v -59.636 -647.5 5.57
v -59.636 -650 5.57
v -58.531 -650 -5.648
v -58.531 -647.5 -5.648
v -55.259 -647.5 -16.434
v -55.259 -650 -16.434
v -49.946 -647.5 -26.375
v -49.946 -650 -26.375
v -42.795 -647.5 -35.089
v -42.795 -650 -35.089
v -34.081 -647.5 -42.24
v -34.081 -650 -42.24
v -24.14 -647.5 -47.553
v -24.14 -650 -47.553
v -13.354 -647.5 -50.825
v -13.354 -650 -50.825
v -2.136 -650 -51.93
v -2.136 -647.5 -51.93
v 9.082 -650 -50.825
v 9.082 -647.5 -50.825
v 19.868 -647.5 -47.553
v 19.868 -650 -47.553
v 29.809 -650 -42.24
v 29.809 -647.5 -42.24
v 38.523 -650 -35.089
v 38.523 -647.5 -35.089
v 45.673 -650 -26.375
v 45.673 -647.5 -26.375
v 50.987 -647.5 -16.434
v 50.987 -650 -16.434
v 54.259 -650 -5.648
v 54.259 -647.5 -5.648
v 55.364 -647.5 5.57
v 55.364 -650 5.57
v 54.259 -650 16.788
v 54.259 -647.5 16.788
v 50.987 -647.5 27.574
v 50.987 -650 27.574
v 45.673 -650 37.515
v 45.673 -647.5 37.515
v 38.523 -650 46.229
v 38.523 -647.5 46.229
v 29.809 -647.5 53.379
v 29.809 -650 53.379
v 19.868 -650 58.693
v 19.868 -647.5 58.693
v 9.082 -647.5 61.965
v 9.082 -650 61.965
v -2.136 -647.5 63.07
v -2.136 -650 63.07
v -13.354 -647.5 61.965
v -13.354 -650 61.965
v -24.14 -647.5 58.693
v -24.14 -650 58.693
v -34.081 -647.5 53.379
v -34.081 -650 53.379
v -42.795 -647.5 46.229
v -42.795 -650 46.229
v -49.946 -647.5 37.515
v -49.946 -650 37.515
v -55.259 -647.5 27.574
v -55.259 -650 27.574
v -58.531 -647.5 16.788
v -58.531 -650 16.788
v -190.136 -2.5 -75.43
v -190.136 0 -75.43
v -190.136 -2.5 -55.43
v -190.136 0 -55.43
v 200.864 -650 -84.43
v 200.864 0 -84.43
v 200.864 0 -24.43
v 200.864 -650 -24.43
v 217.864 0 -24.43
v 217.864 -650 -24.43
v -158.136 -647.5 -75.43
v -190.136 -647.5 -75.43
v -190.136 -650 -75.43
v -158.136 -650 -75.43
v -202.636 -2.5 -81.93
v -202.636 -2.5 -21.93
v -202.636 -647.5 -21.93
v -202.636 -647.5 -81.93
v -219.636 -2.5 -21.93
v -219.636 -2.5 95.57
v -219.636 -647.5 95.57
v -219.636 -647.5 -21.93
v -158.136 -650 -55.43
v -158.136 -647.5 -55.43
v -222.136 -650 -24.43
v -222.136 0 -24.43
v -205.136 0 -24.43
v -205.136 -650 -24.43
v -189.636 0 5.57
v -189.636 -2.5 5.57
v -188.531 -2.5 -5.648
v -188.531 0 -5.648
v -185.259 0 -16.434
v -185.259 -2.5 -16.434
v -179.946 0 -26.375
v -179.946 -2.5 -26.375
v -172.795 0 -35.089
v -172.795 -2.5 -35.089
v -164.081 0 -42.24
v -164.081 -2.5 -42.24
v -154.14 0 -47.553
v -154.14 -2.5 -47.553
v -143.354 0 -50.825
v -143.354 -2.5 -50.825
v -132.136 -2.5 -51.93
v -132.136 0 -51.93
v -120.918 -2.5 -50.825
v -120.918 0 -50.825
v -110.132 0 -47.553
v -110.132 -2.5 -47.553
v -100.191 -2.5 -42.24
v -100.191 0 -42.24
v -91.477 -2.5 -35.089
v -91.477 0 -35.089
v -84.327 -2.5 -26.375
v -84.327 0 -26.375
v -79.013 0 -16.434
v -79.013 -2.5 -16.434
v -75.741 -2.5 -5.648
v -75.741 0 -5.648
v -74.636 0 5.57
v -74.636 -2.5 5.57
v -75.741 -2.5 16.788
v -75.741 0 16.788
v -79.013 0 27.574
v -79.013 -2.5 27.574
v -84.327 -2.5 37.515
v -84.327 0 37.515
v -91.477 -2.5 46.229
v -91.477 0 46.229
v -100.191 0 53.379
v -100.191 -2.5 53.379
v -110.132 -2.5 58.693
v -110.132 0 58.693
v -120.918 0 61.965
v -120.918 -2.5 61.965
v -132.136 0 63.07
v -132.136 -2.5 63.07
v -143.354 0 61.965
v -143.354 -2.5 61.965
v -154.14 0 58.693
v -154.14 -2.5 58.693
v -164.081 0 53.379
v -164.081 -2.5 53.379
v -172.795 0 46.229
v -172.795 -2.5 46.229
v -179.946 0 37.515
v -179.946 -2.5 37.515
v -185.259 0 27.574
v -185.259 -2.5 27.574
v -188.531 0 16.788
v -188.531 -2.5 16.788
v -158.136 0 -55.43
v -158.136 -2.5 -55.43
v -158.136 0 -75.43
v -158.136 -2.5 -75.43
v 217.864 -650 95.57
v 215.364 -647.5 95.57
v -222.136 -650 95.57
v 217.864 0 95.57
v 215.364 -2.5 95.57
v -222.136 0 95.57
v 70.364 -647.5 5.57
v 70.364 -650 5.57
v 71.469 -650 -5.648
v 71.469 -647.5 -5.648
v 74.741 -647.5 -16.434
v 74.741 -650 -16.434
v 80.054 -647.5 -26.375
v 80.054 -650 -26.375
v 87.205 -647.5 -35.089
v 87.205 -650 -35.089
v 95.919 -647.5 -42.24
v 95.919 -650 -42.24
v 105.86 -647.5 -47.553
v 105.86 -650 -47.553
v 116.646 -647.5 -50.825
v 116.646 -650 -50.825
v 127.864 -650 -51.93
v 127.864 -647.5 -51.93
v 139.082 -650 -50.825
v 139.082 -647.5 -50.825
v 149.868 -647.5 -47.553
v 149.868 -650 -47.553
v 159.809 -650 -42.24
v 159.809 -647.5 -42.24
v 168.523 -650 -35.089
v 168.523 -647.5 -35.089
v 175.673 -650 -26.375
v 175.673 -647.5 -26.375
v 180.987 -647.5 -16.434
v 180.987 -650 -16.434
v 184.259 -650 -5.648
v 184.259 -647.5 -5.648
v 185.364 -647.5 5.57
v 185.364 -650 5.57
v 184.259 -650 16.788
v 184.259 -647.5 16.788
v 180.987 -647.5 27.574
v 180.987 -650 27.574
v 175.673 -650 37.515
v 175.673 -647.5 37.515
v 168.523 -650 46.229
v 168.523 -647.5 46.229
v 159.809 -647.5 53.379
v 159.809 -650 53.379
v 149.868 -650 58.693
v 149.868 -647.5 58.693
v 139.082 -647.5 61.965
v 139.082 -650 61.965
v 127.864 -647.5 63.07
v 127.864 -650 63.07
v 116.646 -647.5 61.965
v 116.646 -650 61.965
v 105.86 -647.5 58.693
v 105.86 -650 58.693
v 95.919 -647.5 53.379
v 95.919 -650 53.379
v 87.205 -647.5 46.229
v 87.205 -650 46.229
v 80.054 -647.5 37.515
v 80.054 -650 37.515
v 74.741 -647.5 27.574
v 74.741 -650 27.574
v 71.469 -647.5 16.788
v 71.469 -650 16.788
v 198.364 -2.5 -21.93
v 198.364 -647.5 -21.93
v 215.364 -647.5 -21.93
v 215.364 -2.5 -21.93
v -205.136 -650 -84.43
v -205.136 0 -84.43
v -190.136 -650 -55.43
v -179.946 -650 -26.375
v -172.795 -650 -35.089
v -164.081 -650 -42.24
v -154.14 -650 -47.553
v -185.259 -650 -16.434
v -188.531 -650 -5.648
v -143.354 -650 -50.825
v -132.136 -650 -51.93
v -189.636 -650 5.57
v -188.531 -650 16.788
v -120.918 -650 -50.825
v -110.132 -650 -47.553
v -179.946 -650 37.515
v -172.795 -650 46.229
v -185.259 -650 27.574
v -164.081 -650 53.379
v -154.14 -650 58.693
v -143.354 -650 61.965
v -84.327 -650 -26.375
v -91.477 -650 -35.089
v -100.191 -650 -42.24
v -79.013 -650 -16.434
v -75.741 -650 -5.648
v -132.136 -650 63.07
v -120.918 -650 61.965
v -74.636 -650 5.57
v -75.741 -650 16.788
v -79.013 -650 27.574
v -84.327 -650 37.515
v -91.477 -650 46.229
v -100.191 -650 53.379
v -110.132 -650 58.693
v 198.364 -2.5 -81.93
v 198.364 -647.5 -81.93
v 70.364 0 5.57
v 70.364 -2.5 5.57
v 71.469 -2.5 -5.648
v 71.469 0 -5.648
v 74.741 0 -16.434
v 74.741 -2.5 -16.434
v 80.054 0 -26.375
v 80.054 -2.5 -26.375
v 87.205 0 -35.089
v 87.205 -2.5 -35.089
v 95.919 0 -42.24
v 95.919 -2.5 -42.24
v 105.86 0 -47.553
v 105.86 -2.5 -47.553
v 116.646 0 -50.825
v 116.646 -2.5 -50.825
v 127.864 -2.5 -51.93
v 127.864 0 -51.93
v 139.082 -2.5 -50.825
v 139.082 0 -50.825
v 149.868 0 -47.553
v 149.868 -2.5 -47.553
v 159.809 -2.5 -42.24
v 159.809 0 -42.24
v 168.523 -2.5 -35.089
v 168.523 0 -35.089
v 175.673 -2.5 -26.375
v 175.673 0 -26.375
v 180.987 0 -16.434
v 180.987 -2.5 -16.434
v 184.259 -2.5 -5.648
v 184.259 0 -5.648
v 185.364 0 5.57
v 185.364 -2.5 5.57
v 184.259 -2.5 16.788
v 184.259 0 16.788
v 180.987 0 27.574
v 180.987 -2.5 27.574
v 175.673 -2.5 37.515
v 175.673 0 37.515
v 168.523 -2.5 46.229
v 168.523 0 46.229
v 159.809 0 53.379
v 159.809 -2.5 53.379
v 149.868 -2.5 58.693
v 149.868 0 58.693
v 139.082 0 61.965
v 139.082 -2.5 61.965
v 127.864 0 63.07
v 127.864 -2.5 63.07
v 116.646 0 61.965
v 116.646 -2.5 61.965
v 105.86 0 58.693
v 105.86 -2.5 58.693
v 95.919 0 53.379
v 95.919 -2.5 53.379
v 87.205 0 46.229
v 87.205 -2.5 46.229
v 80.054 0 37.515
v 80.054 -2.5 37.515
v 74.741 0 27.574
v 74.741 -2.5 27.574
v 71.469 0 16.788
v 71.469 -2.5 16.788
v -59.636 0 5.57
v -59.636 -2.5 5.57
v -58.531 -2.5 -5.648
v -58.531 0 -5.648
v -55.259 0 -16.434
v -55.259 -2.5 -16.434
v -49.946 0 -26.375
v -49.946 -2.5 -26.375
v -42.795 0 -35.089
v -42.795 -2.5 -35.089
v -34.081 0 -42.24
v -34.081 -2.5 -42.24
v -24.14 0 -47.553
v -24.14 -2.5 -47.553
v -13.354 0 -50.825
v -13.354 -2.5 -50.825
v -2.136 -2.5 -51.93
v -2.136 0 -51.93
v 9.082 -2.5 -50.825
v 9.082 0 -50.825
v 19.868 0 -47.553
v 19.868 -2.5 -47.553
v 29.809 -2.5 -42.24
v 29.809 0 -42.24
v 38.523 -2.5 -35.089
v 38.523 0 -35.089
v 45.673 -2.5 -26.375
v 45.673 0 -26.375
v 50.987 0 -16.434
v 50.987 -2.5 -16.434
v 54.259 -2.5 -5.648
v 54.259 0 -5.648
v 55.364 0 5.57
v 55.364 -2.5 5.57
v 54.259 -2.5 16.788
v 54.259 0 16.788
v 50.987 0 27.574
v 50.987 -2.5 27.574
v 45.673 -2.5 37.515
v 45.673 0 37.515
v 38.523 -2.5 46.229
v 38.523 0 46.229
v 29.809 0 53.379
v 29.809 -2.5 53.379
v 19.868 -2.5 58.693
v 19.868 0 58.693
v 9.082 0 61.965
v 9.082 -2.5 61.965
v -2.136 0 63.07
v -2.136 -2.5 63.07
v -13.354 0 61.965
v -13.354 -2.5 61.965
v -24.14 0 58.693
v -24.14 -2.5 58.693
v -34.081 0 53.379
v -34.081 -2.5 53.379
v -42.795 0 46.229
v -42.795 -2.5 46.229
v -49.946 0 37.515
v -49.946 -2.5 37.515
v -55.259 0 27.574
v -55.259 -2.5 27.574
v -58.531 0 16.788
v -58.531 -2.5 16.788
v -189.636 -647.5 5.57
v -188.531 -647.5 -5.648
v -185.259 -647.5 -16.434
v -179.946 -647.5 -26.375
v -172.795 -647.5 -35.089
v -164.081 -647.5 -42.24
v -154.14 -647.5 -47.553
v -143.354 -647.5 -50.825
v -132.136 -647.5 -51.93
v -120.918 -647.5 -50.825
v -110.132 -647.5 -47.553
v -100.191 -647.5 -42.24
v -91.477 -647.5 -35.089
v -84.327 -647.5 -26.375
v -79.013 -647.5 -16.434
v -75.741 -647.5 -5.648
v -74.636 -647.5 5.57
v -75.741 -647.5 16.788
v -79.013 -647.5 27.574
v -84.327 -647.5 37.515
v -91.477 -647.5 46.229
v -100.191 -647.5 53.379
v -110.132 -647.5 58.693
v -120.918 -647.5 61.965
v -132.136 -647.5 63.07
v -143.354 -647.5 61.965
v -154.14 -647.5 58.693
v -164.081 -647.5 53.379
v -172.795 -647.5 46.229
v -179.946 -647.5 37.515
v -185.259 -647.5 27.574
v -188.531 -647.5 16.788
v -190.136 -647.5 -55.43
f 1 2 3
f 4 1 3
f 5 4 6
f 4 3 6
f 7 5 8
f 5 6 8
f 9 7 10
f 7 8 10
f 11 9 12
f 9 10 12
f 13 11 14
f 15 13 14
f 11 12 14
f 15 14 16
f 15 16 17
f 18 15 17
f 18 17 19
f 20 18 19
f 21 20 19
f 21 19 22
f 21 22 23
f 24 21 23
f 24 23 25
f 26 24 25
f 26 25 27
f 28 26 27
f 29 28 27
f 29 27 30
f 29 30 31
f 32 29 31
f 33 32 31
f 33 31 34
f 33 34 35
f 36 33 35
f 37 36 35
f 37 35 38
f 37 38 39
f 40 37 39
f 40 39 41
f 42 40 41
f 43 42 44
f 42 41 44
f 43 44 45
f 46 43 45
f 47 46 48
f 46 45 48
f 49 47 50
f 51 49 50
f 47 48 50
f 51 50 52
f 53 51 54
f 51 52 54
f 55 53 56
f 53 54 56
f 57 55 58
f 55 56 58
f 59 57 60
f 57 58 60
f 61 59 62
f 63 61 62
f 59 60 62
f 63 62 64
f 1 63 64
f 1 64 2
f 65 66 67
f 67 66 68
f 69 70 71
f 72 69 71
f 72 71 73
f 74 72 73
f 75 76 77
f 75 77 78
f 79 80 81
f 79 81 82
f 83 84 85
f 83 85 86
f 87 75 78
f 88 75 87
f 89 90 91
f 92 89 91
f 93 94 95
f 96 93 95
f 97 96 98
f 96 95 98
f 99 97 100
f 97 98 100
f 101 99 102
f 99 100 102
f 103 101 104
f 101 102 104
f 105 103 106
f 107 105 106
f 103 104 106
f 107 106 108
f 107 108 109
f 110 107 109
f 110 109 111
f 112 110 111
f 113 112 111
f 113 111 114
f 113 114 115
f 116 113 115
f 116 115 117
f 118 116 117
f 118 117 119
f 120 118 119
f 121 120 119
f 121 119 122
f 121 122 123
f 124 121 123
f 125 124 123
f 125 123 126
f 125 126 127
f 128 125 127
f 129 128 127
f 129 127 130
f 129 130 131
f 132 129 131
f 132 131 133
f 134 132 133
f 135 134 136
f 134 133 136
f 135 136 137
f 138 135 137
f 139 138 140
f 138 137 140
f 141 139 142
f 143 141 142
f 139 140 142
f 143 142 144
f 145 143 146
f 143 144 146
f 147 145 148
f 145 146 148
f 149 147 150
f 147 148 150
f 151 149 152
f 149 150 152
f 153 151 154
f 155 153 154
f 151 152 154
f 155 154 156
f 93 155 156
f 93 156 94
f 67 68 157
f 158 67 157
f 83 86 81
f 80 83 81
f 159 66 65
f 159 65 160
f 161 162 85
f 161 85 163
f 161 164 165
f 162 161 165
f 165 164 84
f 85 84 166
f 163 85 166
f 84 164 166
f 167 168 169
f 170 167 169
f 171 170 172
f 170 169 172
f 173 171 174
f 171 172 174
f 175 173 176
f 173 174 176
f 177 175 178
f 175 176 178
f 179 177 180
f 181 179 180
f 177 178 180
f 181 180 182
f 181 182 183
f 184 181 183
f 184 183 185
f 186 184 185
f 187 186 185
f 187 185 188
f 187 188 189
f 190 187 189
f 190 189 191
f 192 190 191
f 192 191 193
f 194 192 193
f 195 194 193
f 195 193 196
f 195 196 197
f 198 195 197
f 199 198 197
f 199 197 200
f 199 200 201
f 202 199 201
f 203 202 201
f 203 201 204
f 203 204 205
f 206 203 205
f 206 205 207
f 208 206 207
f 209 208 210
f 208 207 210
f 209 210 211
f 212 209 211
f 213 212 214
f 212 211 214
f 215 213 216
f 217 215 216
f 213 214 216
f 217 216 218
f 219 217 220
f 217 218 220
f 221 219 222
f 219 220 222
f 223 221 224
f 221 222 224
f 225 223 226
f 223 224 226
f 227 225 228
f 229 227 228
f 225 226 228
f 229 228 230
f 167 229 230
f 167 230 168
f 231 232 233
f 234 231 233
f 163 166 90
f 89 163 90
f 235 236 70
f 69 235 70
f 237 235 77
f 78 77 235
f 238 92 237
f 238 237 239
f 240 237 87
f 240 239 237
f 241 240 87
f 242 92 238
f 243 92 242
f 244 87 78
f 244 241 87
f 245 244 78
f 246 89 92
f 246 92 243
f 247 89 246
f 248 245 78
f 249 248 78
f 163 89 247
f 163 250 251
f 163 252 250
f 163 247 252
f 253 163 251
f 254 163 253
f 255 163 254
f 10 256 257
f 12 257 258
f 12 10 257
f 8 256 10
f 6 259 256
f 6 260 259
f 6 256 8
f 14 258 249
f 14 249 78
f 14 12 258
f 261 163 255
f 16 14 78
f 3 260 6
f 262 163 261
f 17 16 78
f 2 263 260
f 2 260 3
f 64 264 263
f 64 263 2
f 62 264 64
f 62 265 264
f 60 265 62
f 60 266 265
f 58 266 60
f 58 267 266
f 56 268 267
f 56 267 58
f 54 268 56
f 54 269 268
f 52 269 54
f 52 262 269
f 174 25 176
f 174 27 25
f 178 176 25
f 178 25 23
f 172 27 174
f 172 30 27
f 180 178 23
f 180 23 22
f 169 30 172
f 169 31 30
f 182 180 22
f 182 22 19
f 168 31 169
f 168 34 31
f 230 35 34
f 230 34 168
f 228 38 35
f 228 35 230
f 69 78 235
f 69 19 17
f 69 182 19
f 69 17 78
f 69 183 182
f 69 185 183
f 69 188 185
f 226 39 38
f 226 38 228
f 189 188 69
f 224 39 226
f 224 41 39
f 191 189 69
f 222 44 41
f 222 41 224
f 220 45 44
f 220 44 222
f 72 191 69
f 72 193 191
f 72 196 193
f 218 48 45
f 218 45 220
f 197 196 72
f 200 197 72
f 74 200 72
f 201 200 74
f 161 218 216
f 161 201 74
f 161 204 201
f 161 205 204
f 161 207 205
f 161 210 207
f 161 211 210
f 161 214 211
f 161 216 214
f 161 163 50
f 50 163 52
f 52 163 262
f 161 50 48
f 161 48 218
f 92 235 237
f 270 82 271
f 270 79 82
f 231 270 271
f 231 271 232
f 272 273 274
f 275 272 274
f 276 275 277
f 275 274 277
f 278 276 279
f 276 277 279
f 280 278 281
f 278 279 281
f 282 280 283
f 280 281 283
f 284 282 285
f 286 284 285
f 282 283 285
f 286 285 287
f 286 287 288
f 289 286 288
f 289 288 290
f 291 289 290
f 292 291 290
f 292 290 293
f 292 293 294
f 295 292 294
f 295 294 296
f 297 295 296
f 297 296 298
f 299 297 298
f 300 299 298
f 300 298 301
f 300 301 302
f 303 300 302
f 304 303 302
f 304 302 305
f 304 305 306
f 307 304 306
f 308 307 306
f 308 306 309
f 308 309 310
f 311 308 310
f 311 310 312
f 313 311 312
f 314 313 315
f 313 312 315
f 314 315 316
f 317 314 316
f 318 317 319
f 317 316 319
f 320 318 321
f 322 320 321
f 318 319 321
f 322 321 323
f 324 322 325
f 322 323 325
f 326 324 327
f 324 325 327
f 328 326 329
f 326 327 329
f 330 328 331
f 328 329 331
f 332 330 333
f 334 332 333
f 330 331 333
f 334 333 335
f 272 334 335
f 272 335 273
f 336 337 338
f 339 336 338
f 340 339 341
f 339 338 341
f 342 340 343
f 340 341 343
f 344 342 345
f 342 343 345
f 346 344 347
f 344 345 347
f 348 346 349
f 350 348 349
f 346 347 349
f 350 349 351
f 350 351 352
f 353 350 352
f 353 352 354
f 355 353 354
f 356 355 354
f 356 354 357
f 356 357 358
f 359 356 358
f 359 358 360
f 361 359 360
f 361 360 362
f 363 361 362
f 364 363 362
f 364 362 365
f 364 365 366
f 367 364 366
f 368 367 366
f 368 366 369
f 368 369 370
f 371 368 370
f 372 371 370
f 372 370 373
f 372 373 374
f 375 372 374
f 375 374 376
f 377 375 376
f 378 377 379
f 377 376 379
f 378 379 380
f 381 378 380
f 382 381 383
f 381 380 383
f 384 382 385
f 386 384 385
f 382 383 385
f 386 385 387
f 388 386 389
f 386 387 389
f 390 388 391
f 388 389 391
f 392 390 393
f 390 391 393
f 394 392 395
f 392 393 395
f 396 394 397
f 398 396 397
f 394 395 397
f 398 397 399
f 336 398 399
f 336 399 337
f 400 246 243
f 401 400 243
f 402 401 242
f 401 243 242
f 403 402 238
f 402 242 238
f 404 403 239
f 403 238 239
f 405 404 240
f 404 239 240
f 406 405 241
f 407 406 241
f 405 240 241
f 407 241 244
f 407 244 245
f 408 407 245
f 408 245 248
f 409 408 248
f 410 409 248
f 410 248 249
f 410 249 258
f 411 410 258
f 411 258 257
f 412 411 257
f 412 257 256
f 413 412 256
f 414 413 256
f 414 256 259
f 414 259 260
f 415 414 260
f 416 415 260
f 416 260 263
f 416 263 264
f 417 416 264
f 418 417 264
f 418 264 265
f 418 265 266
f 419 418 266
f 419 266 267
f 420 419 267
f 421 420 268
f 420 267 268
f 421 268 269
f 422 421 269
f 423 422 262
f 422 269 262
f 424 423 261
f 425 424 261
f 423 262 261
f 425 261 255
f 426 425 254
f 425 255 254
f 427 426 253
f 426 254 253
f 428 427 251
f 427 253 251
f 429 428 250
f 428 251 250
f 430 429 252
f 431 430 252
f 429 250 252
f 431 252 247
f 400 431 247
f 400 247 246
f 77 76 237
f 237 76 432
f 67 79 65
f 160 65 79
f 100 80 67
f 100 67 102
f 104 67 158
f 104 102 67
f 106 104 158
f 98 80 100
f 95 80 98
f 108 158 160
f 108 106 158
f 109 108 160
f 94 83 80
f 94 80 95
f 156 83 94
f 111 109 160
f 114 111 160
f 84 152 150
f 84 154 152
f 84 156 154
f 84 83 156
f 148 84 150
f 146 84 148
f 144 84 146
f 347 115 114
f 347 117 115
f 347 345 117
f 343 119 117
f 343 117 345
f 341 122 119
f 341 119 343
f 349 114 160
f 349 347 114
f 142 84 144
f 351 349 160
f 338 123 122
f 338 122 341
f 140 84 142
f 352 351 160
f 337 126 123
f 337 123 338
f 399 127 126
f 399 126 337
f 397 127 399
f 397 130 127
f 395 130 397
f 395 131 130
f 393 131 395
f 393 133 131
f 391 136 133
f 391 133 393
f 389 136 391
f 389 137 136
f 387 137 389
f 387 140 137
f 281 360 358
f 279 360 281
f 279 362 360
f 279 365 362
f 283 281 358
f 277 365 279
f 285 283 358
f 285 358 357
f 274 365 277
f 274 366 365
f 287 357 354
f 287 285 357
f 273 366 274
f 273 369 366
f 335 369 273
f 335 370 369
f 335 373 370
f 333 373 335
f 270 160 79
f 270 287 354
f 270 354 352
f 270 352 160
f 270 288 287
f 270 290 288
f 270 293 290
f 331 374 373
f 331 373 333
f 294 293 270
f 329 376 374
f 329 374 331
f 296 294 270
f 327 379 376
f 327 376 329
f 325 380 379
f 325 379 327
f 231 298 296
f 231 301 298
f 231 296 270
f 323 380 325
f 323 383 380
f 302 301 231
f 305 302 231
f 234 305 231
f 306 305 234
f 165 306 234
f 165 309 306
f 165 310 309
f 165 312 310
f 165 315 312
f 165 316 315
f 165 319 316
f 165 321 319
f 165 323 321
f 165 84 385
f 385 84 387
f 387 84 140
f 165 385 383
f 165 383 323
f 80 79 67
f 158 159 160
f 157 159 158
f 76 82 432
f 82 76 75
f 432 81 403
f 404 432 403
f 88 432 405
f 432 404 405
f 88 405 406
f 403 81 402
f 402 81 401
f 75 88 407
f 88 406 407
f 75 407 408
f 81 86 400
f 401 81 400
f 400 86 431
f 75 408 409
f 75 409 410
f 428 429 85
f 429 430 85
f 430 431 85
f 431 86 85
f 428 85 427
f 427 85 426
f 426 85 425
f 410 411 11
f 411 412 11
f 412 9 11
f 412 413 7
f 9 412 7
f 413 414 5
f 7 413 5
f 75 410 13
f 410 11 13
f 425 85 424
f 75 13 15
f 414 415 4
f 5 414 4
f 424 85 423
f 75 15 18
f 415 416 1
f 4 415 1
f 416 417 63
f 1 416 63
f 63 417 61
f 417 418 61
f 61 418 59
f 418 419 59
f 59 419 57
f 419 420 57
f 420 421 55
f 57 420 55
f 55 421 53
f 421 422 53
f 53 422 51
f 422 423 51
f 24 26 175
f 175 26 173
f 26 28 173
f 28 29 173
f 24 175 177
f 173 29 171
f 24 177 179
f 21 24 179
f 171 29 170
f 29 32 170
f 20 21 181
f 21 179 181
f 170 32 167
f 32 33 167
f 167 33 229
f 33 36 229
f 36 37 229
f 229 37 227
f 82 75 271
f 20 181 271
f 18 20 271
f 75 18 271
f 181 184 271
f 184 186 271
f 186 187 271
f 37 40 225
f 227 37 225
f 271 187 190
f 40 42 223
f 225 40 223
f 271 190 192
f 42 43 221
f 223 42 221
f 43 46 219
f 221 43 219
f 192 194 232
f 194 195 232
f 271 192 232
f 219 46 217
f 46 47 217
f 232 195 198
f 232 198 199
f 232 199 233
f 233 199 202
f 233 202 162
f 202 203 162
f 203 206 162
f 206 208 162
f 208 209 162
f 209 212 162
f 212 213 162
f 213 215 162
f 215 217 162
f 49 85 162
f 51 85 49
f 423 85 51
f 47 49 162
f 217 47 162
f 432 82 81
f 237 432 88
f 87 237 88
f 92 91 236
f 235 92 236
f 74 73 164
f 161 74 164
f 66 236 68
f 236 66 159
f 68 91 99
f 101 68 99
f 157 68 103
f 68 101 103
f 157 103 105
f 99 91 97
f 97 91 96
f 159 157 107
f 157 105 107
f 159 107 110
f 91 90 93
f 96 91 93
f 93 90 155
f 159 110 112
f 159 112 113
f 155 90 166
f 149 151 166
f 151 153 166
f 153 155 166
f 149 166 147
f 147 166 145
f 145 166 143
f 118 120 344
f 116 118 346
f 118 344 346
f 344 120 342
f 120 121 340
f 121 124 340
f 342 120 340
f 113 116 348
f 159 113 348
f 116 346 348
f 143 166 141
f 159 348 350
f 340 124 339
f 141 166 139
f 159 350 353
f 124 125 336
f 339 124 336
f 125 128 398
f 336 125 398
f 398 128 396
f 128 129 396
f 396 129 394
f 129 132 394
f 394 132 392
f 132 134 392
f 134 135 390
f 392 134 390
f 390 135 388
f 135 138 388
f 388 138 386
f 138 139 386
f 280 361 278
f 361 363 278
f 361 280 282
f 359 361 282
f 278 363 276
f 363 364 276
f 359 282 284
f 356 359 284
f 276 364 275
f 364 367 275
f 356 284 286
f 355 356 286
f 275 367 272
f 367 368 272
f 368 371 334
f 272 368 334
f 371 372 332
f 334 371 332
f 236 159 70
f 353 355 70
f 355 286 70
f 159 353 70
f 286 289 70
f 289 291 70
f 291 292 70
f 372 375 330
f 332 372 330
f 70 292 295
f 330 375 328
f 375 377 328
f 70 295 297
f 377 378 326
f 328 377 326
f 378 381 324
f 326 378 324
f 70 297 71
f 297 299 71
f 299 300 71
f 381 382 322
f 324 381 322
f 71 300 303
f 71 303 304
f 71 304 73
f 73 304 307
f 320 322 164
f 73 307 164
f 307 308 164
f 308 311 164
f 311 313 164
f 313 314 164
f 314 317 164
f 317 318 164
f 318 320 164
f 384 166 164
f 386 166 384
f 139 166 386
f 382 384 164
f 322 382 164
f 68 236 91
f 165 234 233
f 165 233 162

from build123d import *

# Parameters (mm, degrees)
F0_W     = 32
F0_H     = 20
F1_DEPTH = 650
F2_T     = -2.5
F3_D     = 115
F4_DEPTH = 25


with BuildPart() as f1:
    # F0 (on Front) → F1 (new body)
    with BuildSketch(Plane.XZ):
        Polygon((217.8639564514, 95.5699048042), (-222.1360435486, 95.5699048042), (-222.1360435486, -24.4300951958), (-205.1360435486, -24.4300951958), (-205.1360435486, -84.4300951958), (200.8639564514, -84.4300951958), (200.8639564514, -24.4300951958), (217.8639564514, -24.4300951958), align=None)
        with Locations((-174.1360435486, -65.4300951958)):
            Rectangle(F0_W, F0_H, mode=Mode.SUBTRACT)
    extrude(amount=F1_DEPTH)

    # F2
    f2_openings = [f1.faces().sort_by_distance(p)[0] for p in [
        (-2.136044, -325, 95.569905),
    ]]
    offset(amount=F2_T, openings=f2_openings, kind=Kind.INTERSECTION)

    # F3 (through all)
    with Locations(Plane(origin=(0, 0, 0), x_dir=(1, 0, 0), z_dir=(0, 1, 0))):
        with Locations((-132.1360435486, -5.5699048042), (-2.1360435486, -5.5699048042), (127.8639564514, -5.5699048042)):
            Hole(F3_D / 2)

    # F4 (cut): a face of the model
    f4_faces = [f1.faces().sort_by_distance(p)[0] for p in [
        (-174.1360435486, -325, -52.9300951958),
    ]]
    extrude(f4_faces, amount=-F4_DEPTH, mode=Mode.SUBTRACT)


solid = f1.part
